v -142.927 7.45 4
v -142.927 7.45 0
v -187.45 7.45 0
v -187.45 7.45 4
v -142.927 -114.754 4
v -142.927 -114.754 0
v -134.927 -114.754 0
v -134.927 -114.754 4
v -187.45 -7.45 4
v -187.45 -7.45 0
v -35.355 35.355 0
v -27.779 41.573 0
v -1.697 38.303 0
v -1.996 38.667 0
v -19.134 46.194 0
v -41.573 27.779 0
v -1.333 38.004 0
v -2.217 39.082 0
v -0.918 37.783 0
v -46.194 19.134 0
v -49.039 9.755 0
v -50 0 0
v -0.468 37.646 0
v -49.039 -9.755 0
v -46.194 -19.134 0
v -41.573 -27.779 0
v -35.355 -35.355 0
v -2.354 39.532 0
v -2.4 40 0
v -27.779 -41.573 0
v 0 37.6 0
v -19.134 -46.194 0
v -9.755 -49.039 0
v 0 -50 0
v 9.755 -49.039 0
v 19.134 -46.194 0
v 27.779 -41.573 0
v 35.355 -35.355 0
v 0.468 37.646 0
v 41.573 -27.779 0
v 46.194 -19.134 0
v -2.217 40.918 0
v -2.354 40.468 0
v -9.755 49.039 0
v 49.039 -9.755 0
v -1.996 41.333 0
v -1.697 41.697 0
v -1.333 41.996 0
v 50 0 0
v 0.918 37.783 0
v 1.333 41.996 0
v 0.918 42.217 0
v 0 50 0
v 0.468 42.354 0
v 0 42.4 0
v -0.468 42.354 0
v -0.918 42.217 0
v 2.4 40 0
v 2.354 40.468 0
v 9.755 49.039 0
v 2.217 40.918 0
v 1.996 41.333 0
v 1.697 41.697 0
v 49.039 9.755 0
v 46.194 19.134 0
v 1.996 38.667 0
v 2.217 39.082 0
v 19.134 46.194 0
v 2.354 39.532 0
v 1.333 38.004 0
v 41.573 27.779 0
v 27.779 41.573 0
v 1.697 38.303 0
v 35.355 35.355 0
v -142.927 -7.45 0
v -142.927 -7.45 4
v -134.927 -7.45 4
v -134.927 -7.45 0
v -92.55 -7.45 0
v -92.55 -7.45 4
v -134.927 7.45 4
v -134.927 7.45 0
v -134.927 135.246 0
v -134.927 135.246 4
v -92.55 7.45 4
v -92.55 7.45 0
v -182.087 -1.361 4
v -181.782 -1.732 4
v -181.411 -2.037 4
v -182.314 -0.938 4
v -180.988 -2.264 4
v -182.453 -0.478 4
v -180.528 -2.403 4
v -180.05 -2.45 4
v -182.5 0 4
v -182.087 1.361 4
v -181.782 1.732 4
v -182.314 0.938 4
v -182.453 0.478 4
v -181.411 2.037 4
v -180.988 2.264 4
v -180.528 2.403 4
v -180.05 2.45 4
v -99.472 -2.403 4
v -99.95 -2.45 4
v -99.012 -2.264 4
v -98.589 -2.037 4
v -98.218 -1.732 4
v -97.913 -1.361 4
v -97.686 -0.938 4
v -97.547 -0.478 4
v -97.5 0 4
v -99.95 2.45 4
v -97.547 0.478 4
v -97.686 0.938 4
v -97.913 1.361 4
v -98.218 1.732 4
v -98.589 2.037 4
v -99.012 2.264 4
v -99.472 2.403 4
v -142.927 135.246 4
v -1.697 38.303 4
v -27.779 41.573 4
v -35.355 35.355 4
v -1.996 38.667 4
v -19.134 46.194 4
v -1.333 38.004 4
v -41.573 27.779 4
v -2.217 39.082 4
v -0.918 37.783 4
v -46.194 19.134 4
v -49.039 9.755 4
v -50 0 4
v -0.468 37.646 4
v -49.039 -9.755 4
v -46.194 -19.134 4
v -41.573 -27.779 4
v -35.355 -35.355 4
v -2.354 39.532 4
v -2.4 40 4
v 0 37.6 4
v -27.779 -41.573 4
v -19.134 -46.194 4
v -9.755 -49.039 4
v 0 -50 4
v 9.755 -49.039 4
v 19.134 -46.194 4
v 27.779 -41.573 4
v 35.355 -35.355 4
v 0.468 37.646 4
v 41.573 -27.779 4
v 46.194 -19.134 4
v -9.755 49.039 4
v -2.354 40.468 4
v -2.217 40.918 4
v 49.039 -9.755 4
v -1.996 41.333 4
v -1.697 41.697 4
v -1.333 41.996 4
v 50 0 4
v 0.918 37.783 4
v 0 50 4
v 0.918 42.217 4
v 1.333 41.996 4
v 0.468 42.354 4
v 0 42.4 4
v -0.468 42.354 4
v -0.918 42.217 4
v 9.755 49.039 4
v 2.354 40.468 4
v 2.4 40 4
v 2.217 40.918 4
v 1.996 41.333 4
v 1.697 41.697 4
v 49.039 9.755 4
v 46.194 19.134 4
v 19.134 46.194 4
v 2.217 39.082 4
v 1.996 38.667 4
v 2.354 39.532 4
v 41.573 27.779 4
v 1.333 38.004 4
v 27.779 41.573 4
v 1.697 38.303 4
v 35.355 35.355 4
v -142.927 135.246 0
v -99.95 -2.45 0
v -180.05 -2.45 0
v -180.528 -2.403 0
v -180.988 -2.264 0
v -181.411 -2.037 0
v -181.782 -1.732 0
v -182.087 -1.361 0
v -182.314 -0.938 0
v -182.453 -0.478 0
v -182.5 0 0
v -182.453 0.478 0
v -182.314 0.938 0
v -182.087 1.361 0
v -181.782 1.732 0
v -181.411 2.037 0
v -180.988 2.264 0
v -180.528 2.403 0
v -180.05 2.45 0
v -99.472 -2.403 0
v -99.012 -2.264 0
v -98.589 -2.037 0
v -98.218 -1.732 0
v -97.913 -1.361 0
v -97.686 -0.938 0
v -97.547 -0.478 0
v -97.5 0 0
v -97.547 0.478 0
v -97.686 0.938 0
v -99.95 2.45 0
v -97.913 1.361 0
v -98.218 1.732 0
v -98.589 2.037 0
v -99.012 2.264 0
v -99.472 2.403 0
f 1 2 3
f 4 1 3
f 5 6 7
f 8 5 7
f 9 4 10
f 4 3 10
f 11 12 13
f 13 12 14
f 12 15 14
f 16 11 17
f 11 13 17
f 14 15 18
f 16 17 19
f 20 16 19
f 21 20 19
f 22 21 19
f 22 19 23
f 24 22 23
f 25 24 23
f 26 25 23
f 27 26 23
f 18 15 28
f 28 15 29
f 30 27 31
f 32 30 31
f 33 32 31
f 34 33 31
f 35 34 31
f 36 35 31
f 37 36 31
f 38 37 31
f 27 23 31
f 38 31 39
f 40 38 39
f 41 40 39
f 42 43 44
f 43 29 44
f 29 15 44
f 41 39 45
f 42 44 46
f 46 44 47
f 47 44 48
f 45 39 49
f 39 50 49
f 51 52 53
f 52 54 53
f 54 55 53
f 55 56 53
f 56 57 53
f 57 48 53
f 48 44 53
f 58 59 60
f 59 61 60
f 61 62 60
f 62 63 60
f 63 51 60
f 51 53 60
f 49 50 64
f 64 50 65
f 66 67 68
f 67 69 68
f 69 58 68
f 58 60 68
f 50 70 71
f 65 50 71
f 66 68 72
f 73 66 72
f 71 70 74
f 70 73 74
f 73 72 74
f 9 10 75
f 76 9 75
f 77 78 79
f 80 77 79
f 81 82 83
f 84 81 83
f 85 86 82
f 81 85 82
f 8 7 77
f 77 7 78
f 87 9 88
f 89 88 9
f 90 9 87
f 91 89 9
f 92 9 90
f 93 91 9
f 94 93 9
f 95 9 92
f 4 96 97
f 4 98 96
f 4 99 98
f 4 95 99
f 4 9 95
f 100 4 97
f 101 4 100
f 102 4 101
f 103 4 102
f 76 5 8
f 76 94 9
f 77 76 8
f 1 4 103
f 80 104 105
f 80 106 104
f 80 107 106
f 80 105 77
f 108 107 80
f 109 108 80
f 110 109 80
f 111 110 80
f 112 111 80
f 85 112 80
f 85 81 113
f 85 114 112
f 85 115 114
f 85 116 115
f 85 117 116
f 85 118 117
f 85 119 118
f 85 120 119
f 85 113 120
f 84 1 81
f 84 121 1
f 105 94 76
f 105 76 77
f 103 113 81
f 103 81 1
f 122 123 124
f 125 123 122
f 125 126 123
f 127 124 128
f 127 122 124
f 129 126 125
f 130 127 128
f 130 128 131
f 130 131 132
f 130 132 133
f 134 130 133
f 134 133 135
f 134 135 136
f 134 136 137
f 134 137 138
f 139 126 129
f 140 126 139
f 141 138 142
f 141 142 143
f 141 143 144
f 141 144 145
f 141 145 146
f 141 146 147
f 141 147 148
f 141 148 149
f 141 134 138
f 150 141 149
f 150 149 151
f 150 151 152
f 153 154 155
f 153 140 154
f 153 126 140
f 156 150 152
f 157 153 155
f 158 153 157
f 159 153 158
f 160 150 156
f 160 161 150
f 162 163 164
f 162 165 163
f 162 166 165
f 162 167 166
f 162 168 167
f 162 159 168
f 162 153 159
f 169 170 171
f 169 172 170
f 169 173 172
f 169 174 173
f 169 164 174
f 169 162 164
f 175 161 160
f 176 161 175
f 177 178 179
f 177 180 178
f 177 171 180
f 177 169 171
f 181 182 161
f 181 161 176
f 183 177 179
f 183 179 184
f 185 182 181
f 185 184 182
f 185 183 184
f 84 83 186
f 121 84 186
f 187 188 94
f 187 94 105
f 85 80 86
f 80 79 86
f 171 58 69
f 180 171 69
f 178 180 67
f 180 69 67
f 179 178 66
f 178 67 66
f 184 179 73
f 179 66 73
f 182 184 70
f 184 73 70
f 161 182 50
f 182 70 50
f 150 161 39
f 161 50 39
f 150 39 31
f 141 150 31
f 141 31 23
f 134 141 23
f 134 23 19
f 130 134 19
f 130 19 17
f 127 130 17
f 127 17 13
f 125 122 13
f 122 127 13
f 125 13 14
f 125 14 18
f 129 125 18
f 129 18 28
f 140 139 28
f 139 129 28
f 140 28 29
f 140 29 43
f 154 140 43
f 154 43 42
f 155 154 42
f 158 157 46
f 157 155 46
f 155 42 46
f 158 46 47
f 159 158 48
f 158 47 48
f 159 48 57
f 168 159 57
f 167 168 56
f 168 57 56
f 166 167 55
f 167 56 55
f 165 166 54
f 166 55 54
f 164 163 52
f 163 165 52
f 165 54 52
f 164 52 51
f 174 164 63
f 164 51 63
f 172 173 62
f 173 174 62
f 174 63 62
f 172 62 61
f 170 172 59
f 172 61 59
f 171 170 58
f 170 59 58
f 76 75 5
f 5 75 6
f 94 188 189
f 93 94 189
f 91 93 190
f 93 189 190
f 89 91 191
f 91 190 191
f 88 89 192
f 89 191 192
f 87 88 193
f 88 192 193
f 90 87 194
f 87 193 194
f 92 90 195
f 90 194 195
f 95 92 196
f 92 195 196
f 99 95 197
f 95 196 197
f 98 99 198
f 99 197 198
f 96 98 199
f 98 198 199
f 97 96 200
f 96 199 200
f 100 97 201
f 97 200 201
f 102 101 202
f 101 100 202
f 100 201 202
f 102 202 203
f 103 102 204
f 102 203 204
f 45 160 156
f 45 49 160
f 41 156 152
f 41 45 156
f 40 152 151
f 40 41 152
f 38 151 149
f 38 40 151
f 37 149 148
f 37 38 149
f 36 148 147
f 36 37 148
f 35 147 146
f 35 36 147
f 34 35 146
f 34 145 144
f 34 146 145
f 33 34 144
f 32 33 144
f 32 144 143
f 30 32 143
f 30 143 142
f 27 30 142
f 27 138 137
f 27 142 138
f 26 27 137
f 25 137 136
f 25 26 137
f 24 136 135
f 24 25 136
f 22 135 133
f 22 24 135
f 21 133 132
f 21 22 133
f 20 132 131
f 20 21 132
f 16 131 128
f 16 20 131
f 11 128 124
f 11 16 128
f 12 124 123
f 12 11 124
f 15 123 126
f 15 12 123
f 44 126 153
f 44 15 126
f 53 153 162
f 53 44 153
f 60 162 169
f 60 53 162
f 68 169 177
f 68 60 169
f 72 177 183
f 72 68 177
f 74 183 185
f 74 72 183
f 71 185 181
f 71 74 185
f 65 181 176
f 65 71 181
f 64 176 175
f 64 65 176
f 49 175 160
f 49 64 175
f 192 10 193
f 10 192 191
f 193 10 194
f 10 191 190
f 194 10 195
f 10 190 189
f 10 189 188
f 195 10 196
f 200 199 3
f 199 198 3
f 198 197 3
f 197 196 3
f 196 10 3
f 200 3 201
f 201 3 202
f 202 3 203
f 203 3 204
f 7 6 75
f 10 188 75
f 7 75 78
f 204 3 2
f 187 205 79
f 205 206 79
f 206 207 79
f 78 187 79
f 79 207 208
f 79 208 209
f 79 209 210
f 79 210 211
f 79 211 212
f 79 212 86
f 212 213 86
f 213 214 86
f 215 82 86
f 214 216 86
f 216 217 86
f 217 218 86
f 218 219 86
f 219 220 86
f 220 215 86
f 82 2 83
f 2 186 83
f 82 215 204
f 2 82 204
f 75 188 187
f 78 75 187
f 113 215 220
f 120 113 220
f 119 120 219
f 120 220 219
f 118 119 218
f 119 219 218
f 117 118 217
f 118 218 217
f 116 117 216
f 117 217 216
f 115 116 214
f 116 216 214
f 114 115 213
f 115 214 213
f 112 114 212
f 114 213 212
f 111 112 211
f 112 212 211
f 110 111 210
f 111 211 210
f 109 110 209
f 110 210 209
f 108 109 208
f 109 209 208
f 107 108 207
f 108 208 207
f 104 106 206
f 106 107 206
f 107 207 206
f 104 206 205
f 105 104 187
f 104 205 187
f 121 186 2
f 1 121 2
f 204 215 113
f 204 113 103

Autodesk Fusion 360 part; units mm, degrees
sketch "Sketch1" plane through (0, 0, 0) normal (0, 0, 1) x (1, 0, 0)
  line L0 (-134.9268, 7.45) -> (-134.9268, 135.2463)
  line L1 (-99.95, -2.45) -> (-99.95, -2.4)
  line L2 (-187.45, 7.45) -> (-187.45, -7.45)
  line L3 (-134.9268, 135.2463) -> (-142.9268, 135.2463)
  line L4 (-134.9268, -7.45) -> (-92.55, -7.45)
  line L5 (-99.95, 2.45) -> (-180.05, 2.45)
  line L6 (-92.55, -7.45) -> (-92.55, 7.45)
  arc A0 (-99.95, -2.45) -> (-99.95, 2.45) centre (-99.95, 0) ccw
  line L7 (-134.9268, -114.7537) -> (-134.9268, -7.45)
  line L8 (-99.95, 2.4) -> (-99.95, 2.45)
  line L9 (-180.05, -2.45) -> (-99.95, -2.45)
  line L10 (-92.55, 7.45) -> (-134.9268, 7.45)
  line L11 (-142.9268, 7.45) -> (-187.45, 7.45)
  arc A1 (-180.05, 2.45) -> (-180.05, -2.45) centre (-180.05, 0) ccw
  line L12 (-142.9268, 135.2463) -> (-142.9268, 7.45)
  line L13 (-142.9268, -7.45) -> (-142.9268, -114.7537)
  line L14 (-142.9268, -114.7537) -> (-134.9268, -114.7537)
  line L15 (-187.45, -7.45) -> (-142.9268, -7.45)
  point P0 (-140, 0)
  point P1 (-99.95, 0)
  point P2 (-180.05, 0)
  point P3 (-140, 0)
  point P4 (-140, 0)
  point P5 (-140, 0)
  dimension "d12" = 8
  dimension "d13" = 250
  dimension "d14" = 94.9
  dimension "d15" = 14.9
  dimension "d16" = 80.1
  dimension "d17" = 4.9
  dimension "d18" = 4.9
  dimension "d19" = 4.9
sketch "Sketch2" plane through (0, 0, 0) normal (0, 0, 1) x (1, 0, 0)
  circle A0 centre (0, 0) radius 50
  circle A1 centre (0, 40) radius 2.4
  dimension "d20" = 100
  dimension "d22" = 4.8
extrude "Extrude1" add sketch "Sketch2" along normal blind 4 makes body 1
extrude "Extrude2" add sketch "Sketch1" along normal blind 4 separate body makes body 2
sketch "Sketch5" plane through (0, 0, 4) normal (0, 0, 1) x (-1, 0, 0)
  circle A0 centre (0, -40) radius 2.4
  circle A1 centre (0, 0) radius 50
  arc A2 (180.05, -2.45) -> (180.05, 2.45) centre (180.05, 0) ccw
  line L0 (180.05, -2.45) -> (99.95, -2.45)
  arc A3 (99.95, 2.45) -> (99.95, -2.45) centre (99.95, 0) ccw
  line L1 (99.95, 2.45) -> (180.05, 2.45)
  line L2 (187.45, 7.45) -> (142.9268, 7.45)
  line L3 (142.9268, 7.45) -> (142.9268, 114.7537)
  line L4 (142.9268, 114.7537) -> (134.9268, 114.7537)
  line L5 (134.9268, 114.7537) -> (134.9268, 7.45)
  line L6 (134.9268, 7.45) -> (92.55, 7.45)
  line L7 (92.55, 7.45) -> (92.55, -7.45)
  line L8 (92.55, -7.45) -> (134.9268, -7.45)
  line L9 (134.9268, -7.45) -> (134.9268, -135.2463)
  line L10 (134.9268, -135.2463) -> (142.9268, -135.2463)
  line L11 (142.9268, -135.2463) -> (142.9268, -7.45)
  line L12 (142.9268, -7.45) -> (187.45, -7.45)
  line L13 (187.45, -7.45) -> (187.45, 7.45)
sketch "Sketch6" plane through (0, 0, 0) normal (0, 0, 1) x (1, 0, 0)
equation "d14 = ( 2 * 45 ) * 1 mm + 4.8 mm + 0.1 mm"
equation "d15 = ( 2 * 5 ) * 1 mm + 4.8 mm + 0.1 mm"
equation "d16 = ( 40 * 2 ) * 1 mm + 0.1 mm"
equation "d17 = 4.8 mm + 0.1 mm"
equation "d18 = 4.8 mm + 0.1 mm"
equation "d19 = 4.8 mm + 0.1 mm"
